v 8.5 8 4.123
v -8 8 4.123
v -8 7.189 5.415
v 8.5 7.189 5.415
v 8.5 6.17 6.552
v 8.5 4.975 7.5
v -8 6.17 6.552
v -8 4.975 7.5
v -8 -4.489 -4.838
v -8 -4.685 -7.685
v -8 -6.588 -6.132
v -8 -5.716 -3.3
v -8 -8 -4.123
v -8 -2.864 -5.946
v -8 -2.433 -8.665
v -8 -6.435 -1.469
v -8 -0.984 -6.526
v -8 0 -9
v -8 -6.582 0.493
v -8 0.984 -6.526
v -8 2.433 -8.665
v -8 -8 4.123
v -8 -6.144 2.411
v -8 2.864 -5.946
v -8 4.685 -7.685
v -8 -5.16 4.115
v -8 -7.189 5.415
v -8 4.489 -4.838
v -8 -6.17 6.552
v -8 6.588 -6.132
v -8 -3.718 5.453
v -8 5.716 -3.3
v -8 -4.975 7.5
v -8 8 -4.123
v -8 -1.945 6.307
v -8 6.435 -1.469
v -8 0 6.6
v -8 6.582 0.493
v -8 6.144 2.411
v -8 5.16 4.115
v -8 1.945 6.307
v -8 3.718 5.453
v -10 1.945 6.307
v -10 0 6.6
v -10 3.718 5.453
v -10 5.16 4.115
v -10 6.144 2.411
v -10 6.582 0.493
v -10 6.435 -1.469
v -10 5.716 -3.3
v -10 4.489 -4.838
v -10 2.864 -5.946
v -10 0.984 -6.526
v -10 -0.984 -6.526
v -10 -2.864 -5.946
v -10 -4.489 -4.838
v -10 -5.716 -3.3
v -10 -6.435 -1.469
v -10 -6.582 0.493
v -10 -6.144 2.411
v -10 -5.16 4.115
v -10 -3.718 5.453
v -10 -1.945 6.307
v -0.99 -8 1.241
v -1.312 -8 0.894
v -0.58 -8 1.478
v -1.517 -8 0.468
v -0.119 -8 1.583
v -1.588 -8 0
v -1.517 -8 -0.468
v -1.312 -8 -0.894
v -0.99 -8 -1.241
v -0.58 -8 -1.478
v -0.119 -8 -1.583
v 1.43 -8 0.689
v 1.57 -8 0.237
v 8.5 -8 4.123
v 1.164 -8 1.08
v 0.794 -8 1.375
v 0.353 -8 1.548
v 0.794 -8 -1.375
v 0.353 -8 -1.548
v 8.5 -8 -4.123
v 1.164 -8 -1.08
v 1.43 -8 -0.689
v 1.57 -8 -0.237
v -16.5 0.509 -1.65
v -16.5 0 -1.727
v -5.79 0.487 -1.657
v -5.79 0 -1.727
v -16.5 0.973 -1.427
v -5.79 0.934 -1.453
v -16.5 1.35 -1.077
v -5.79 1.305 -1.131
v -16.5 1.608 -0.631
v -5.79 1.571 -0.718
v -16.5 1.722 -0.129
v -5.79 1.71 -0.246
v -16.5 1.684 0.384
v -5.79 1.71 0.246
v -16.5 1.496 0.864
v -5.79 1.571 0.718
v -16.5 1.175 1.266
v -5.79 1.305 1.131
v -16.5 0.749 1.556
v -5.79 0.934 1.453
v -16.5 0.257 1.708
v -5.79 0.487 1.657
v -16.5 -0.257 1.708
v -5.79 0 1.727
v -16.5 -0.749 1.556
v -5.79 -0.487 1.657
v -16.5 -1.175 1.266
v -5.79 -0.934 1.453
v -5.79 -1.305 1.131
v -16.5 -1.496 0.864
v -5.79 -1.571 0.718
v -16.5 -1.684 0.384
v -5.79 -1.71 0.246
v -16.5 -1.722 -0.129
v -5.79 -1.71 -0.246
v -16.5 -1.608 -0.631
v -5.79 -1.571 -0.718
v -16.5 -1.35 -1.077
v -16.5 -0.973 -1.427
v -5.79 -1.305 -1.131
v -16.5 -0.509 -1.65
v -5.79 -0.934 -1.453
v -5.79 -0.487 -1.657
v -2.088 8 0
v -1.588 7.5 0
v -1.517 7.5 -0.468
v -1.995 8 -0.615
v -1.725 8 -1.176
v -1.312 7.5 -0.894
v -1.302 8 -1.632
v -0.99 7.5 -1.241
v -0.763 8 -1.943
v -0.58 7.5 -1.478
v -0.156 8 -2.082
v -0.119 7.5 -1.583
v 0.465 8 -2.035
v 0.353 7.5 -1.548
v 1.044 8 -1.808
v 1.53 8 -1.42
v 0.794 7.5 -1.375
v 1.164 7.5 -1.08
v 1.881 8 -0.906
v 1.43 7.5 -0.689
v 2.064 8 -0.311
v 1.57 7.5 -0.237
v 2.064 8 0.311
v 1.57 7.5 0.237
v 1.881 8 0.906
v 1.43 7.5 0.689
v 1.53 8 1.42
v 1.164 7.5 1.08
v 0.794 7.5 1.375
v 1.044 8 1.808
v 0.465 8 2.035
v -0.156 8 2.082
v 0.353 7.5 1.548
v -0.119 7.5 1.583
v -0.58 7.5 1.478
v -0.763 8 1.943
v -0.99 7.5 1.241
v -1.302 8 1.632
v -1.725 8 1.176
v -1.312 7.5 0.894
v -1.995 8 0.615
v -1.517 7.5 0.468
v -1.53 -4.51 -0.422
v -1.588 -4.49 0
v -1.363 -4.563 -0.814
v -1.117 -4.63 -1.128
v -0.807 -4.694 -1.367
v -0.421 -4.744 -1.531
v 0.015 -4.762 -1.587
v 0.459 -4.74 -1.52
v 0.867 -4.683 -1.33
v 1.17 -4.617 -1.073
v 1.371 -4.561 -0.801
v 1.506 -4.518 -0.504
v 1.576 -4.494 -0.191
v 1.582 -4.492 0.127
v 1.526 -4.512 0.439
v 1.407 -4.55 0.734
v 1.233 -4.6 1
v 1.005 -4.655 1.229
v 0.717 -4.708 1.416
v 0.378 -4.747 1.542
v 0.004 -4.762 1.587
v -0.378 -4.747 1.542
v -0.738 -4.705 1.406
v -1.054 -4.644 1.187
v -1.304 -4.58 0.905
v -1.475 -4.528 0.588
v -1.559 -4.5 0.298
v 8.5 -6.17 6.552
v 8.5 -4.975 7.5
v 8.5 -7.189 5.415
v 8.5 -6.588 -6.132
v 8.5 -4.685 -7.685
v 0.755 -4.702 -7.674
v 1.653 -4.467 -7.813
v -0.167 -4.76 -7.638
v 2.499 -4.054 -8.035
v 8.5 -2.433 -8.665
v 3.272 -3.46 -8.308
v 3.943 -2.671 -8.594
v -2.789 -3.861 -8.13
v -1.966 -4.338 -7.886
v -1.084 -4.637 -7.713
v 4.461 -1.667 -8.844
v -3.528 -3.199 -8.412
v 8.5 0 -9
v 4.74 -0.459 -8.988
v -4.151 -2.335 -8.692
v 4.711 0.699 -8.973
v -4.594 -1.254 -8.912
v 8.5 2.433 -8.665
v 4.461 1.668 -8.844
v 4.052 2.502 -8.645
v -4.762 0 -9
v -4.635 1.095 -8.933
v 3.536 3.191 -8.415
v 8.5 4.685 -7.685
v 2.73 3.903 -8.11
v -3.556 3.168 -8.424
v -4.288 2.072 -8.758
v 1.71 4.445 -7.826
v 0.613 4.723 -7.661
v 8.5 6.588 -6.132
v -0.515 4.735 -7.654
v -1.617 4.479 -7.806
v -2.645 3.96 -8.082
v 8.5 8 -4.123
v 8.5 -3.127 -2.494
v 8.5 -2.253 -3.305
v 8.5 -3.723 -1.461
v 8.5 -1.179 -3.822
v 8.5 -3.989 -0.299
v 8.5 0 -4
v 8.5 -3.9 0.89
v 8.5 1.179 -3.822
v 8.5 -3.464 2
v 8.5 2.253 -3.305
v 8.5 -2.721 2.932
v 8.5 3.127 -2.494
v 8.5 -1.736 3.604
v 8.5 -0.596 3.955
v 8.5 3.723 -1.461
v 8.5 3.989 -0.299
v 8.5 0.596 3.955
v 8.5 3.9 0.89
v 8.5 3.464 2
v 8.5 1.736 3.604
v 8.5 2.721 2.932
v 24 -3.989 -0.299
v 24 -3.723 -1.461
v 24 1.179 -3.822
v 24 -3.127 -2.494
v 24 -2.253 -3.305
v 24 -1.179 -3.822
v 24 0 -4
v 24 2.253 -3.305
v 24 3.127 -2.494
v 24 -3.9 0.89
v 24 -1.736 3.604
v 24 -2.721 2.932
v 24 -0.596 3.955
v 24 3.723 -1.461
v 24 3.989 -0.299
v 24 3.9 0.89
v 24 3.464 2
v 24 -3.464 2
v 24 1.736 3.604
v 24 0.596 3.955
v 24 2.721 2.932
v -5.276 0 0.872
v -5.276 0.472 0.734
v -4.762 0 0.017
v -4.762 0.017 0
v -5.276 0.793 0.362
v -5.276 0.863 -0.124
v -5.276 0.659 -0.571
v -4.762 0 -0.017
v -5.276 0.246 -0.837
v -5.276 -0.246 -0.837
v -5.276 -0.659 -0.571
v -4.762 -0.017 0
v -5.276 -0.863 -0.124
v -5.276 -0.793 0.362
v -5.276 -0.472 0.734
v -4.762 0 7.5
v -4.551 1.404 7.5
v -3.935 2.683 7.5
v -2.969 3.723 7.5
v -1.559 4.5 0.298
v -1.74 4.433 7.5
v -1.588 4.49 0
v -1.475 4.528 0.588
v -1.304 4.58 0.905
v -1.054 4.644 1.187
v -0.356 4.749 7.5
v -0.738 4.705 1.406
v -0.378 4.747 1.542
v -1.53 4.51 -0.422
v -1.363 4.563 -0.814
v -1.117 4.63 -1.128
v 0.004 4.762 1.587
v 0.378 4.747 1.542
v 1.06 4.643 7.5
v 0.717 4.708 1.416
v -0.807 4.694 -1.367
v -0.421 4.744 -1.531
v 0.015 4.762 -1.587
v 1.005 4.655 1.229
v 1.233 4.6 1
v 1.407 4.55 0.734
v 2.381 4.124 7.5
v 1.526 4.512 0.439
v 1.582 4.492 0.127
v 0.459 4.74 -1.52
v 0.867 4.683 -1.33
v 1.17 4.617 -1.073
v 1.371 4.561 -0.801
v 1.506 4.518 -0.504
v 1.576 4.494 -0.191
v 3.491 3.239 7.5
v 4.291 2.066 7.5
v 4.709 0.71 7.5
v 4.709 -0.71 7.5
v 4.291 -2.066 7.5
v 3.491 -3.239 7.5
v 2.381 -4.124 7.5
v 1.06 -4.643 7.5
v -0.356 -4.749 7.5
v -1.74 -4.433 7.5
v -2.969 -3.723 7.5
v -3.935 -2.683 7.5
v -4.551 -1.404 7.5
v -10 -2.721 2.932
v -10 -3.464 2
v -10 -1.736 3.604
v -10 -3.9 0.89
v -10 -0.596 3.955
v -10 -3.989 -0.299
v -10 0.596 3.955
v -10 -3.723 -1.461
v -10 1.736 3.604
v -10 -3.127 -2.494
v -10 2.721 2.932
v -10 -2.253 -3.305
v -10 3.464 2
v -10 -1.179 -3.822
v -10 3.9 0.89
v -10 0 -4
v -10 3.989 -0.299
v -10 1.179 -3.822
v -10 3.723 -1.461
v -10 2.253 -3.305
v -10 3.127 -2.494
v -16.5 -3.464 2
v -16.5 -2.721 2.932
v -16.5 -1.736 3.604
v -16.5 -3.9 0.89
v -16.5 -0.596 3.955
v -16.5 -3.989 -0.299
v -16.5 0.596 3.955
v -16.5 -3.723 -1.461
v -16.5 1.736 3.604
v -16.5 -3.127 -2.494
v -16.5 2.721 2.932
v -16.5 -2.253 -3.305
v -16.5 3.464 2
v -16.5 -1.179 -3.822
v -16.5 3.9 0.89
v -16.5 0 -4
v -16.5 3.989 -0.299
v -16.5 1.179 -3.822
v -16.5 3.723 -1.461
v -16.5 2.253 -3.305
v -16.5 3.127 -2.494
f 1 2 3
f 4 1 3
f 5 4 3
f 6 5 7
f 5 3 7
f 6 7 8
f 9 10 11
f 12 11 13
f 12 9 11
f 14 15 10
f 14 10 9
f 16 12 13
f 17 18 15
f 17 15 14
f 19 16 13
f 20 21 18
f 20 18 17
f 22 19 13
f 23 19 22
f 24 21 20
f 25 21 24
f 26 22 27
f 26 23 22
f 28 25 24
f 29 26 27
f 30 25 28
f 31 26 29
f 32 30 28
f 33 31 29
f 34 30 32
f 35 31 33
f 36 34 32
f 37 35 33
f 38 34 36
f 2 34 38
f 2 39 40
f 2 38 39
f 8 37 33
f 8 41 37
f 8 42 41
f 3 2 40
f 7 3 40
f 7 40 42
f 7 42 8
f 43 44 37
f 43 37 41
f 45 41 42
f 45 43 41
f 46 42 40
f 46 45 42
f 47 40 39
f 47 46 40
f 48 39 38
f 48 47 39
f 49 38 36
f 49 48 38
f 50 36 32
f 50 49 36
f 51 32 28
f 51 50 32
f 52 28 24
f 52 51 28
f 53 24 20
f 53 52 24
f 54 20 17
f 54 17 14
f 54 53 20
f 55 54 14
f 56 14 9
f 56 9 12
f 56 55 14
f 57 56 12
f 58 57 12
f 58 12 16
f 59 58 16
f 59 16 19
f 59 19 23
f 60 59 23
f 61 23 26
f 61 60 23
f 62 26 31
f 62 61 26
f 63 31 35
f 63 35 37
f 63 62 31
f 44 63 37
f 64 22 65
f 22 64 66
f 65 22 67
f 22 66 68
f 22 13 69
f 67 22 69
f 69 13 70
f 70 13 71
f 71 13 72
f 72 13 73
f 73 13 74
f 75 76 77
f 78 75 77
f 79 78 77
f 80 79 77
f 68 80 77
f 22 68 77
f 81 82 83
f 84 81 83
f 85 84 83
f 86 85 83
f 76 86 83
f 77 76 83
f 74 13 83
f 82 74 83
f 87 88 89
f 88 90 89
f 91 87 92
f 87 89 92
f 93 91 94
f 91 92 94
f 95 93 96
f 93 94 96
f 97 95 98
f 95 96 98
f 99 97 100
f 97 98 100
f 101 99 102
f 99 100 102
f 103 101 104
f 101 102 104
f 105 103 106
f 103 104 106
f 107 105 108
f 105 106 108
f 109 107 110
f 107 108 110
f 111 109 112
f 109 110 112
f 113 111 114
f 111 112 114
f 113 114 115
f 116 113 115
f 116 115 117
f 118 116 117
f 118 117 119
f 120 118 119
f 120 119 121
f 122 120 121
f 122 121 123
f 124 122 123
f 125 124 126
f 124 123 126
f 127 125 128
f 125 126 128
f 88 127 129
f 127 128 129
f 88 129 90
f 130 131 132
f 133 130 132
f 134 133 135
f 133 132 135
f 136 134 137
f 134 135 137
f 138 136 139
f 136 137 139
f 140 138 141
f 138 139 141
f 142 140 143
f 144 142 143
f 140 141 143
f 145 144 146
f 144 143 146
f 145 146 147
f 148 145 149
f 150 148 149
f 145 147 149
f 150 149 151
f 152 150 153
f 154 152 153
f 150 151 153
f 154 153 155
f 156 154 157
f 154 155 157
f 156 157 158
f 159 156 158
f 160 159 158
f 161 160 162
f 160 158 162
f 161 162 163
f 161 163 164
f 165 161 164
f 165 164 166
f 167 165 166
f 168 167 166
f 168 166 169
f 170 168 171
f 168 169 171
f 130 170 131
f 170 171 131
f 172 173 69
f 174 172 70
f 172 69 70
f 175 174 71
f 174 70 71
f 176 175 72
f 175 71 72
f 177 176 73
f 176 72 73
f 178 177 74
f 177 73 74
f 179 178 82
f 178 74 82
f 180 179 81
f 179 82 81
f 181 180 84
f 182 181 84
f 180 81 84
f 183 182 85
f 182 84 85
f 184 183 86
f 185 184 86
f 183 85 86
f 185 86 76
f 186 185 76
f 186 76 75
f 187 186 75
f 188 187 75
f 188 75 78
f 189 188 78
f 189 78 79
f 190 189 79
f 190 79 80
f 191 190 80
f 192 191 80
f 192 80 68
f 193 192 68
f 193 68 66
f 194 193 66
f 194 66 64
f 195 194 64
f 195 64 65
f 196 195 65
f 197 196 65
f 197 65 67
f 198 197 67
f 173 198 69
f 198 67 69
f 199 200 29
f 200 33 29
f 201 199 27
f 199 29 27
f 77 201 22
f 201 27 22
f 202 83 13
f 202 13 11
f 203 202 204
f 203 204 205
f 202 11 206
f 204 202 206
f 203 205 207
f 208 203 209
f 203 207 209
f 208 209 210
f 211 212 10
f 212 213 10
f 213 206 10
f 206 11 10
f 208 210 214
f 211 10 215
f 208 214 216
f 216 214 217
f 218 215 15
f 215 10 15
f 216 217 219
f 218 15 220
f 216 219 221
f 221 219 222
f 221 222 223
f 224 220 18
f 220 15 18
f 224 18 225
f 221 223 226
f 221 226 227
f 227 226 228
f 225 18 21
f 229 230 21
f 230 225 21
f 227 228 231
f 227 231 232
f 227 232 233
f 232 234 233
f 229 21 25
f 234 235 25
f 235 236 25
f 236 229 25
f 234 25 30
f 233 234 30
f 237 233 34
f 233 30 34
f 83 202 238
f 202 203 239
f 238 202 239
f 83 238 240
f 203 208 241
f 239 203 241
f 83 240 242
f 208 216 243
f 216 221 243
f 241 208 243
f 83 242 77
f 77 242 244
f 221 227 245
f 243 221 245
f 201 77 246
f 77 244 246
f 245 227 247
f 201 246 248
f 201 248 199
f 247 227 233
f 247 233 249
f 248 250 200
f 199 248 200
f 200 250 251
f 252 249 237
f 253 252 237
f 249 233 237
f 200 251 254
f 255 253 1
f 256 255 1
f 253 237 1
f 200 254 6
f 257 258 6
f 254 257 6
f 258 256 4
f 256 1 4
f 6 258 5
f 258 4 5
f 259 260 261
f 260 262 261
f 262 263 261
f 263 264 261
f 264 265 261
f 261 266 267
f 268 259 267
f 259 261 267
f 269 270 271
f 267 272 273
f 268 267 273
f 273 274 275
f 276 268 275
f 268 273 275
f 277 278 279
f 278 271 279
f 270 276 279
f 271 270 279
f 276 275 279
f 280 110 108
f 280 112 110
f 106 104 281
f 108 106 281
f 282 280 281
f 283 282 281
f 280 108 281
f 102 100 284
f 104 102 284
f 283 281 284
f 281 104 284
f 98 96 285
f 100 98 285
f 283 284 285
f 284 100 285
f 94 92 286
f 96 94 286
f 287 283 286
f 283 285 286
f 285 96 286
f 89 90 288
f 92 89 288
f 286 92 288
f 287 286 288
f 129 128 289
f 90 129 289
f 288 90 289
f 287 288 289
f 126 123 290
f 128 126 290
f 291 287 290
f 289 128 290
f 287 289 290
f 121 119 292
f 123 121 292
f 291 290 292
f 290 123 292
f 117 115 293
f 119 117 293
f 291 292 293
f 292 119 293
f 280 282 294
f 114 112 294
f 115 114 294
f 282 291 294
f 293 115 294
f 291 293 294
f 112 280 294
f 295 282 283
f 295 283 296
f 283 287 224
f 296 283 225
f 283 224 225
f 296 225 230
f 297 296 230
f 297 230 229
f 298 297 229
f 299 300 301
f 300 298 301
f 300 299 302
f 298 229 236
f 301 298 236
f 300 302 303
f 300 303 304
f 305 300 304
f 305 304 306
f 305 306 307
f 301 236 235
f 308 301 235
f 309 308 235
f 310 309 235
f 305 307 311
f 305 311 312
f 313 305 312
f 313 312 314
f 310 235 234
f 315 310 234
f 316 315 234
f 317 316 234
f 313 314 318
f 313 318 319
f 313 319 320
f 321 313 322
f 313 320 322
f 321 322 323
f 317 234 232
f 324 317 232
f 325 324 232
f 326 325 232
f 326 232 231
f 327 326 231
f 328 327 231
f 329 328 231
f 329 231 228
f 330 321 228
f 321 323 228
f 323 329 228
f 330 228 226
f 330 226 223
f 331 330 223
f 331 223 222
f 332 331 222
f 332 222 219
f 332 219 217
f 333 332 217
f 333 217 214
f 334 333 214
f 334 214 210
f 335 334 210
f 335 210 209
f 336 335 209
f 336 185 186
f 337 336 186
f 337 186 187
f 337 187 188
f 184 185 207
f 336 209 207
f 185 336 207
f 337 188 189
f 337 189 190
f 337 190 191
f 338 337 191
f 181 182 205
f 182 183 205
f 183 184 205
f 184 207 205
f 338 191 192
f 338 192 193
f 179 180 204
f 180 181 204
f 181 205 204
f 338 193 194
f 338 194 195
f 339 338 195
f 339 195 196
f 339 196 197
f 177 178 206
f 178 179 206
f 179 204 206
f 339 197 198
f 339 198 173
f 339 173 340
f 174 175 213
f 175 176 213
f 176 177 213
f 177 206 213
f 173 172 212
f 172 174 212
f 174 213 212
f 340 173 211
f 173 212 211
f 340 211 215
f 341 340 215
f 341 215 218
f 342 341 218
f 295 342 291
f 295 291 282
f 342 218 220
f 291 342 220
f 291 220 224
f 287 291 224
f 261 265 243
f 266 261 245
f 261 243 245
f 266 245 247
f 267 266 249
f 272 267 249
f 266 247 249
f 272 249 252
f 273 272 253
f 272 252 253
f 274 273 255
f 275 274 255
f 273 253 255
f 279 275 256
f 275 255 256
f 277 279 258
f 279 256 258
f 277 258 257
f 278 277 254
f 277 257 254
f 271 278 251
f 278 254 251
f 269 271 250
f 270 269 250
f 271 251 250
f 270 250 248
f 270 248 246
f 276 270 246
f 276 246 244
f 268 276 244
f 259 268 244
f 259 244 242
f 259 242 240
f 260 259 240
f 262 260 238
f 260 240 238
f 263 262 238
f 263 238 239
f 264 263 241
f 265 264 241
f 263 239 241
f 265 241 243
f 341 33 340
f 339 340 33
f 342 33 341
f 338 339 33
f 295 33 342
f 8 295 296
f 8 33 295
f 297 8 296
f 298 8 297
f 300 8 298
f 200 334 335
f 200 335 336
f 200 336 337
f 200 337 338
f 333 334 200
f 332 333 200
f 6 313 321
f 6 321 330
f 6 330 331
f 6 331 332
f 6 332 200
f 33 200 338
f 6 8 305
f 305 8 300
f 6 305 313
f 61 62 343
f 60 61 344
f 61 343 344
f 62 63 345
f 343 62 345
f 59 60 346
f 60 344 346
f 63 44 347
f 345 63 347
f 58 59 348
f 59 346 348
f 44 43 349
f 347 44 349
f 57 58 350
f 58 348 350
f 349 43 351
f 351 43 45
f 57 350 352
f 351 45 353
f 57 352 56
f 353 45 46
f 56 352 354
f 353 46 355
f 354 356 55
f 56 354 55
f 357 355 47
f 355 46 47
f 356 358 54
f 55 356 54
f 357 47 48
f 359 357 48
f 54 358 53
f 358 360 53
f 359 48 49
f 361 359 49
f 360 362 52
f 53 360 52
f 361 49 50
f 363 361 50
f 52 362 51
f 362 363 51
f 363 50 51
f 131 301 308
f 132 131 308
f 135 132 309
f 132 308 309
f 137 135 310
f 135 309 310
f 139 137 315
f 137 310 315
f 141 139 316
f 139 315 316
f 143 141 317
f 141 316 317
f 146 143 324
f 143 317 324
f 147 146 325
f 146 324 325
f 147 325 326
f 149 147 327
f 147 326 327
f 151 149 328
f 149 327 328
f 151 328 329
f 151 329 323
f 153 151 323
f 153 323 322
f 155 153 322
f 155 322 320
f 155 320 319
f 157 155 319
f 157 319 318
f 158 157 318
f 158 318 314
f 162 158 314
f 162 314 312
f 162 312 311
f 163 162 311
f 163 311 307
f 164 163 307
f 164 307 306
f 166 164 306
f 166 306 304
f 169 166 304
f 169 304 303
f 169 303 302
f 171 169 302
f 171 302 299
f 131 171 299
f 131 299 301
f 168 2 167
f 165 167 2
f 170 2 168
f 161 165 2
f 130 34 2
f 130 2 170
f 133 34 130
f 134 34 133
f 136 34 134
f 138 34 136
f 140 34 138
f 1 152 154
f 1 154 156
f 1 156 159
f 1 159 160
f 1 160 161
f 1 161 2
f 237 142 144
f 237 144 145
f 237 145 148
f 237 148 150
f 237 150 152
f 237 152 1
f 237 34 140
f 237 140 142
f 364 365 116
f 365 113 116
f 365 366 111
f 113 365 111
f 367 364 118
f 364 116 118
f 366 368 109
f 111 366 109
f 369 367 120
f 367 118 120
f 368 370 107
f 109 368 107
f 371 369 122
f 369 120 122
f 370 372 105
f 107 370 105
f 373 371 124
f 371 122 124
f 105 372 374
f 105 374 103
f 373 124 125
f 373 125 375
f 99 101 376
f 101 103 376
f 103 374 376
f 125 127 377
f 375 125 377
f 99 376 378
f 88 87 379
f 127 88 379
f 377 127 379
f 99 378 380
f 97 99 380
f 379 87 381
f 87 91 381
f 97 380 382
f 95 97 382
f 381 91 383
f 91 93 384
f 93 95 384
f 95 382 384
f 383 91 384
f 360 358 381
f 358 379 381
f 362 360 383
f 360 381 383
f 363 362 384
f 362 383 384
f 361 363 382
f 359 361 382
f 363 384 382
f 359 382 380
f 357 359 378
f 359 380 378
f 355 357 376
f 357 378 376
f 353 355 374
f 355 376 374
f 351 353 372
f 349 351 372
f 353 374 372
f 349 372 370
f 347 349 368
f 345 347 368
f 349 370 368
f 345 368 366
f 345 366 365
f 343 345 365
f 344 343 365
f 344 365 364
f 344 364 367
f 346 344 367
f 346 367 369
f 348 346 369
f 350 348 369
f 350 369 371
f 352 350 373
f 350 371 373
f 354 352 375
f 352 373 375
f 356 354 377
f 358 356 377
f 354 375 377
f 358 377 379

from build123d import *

# Parameters (mm, degrees)
SKETCH2_W                  = 20
SKETCH2_H                  = 12.7
CUT_EXTRUDE1_DEPTH         = 1.5
F_8_32_TAPPED_HOLE1_D      = 3.4544
F_8_32_TAPPED_HOLE1_DEPTH  = 10.71
F_8_32_TAPPED_HOLE1_TIP    = 1.037806461
SKETCH7_OUTSIDE_W          = 27.958
SKETCH7_OUTSIDE_H          = 29.458
SKETCH7_OUTSIDE_R          = 6.6
CUT_EXTRUDE2_DEPTH         = 2
F_3_8_0_3750_DOWEL_HOLE2_D = 9.525
CUT_EXTRUDE4_START         = 9
SKETCH11_W                 = 18
SKETCH11_H                 = 20
CUT_EXTRUDE4_DEPTH         = 1
F_1_8_0_1250_DOWEL_HOLE1_D = 3.175
CHAMFER1_SIZE              = 0.5


with BuildPart() as part:
    # Sketch1 → Revolve1 (revolve)
    with BuildSketch(Plane(origin=(0, 0, 0), x_dir=(1, 0, 0), z_dir=(0, 1, 0))):
        Polygon((-16.5, 0), (24, 0), (24, 4), (8.5, 4), (8.5, 9), (-10, 9), (-10, 4), (-16.5, 4), align=None)
    revolve(axis=Axis((-16.5, 0, 0), (1, 0, 0)))

    # Sketch2 → Cut-Extrude1 (cut)
    with BuildSketch(Plane.XY.offset(9)):
        Rectangle(SKETCH2_W, SKETCH2_H)
    extrude(amount=-CUT_EXTRUDE1_DEPTH, mode=Mode.SUBTRACT)

    # #8-32 Tapped Hole1
    with Locations(Plane.ZY.offset(16.5)):
        with Locations((0, 0)):
            Hole(F_8_32_TAPPED_HOLE1_D / 2, depth=F_8_32_TAPPED_HOLE1_DEPTH)
            with Locations((0, 0, -(F_8_32_TAPPED_HOLE1_DEPTH + F_8_32_TAPPED_HOLE1_TIP / 2))):  # 118° drill point
                Cone(0, F_8_32_TAPPED_HOLE1_D / 2, F_8_32_TAPPED_HOLE1_TIP, mode=Mode.SUBTRACT)

    # Sketch7 outside → Cut-Extrude2 (cut)
    with BuildSketch(Plane.ZY.offset(10)):
        with Locations((-0.75, 0)):
            Rectangle(SKETCH7_OUTSIDE_W, SKETCH7_OUTSIDE_H)
        Circle(SKETCH7_OUTSIDE_R, mode=Mode.SUBTRACT)
    extrude(amount=-CUT_EXTRUDE2_DEPTH, mode=Mode.SUBTRACT)

    # 3/8 (0.3750) Dowel Hole2 (through all)
    with Locations(Plane.XY.offset(7.5)):
        with Locations((0, 0)):
            Hole(F_3_8_0_3750_DOWEL_HOLE2_D / 2)

    # Sketch11 → Cut-Extrude4 (cut)
    with BuildSketch(Plane(origin=(0, 0, 0), x_dir=(1, 0, 0), z_dir=(0, 1, 0)).offset(CUT_EXTRUDE4_START)):
        Rectangle(SKETCH11_W, SKETCH11_H)
    cut_extrude4 = extrude(amount=-CUT_EXTRUDE4_DEPTH, mode=Mode.SUBTRACT)

    # 1/8 (0.1250) Dowel Hole1 (through all)
    with Locations(Plane(origin=(0, 8, 0), x_dir=(1, 0, 0), z_dir=(0, 1, 0))):
        with Locations((0, 0)):
            Hole(F_1_8_0_1250_DOWEL_HOLE1_D / 2)

    # Mirror1: Cut-Extrude4 across plane
    add(cut_extrude4.mirror(Plane.ZX), mode=Mode.SUBTRACT)

    # Chamfer1
    chamfer1_edges = [part.edges().sort_by_distance(p)[0] for p in [
        (1.5875, 8, 0),
    ]]
    chamfer(chamfer1_edges, length=CHAMFER1_SIZE)


solid = part.part
